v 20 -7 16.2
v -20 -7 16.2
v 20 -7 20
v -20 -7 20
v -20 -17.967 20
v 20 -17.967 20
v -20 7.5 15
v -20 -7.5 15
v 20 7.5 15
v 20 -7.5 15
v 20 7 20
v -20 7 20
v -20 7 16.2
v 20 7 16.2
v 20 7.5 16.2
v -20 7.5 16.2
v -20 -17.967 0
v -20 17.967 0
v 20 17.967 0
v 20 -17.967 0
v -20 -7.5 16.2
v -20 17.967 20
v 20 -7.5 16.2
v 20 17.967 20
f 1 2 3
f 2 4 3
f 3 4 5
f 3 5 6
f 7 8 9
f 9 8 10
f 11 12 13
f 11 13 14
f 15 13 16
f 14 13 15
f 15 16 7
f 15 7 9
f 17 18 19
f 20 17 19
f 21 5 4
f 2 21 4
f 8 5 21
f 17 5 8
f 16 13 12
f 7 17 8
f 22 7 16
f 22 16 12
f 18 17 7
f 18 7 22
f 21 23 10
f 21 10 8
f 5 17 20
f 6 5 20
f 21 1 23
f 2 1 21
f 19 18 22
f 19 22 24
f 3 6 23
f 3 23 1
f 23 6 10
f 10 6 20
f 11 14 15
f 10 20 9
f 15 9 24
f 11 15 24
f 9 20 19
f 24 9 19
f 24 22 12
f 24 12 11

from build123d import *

# Parameters (mm, degrees)
F0_W      = 40
F0_H      = 35.9344822692
F1_DEPTH  = 20
F2_W      = 28
F2_H      = 14
F3_DEPTH  = 5
F4_W      = 14
F4_H      = 1.12
F5_DEPTH  = 3
F6_W      = 3
F6_H      = 1
F7_DEPTH  = 0.5
F8_W      = 12
F8_H      = 14
F9_DEPTH  = 2.5
F10_DEPTH = 25
F11_W     = 9.0484669507
F11_H     = 1.2658234112
F11_H_2   = 5.2294719476
F12_DEPTH = 2.5
F13_W     = 40
F13_H     = 1.2
F14_DEPTH = 0.5
F15_W     = 40
F15_H     = 1.2
F16_DEPTH = 0.5
F17_DEPTH = 2.5


with BuildPart() as f1:
    # F0 (on Top) → F1 (new body)
    with BuildSketch(Plane.XY):
        Rectangle(F0_W, F0_H)
    extrude(amount=F1_DEPTH)

    # F2 (on face) → F3 (cut)
    with BuildSketch(Plane.XY.offset(20)):
        with Locations((6, 0)):
            Rectangle(F2_W, F2_H)
    extrude(amount=-F3_DEPTH, mode=Mode.SUBTRACT)

    # F4 (on face) → F5 (cut)
    with BuildSketch(Plane.YZ.offset(-8)):
        with Locations((0, 15.56)):
            Rectangle(F4_W, F4_H)
    extrude(amount=-F5_DEPTH, mode=Mode.SUBTRACT)

    # F6 (on face) → F7 (cut)
    with BuildSketch(Plane(origin=(0, 0, 16.12), x_dir=(1, 0, 0), z_dir=(0, 0, -1))):
        with Locations((-9.5, -3.5)):
            Rectangle(F6_W, F6_H)
        with Locations((-9.5, -2.25)):
            Rectangle(F6_W, F6_H)
        with Locations((-9.5, -1)):
            Rectangle(F6_W, F6_H)
        with Locations((-9.5, 0.25)):
            Rectangle(F6_W, F6_H)
    extrude(amount=-F7_DEPTH, mode=Mode.SUBTRACT)

    # F8 (on face) → F9 (cut)
    with BuildSketch(Plane.XY.offset(20)):
        with Locations((-14, 0)):
            Rectangle(F8_W, F8_H)
    extrude(amount=-F9_DEPTH, mode=Mode.SUBTRACT)

    # F10 (cut): a face of the model
    f10_faces = [f1.faces().sort_by_distance(p)[0] for p in [
        (-11, 0.1838235294, 15.6516289593),
    ]]
    extrude(f10_faces, amount=-F10_DEPTH, mode=Mode.SUBTRACT)

    # F11 (on face) → F12 (cut, through all)
    with BuildSketch(Plane.XY.offset(17.5)):
        with Locations((-12.5242334753, 6.3670882944)):
            Rectangle(F11_W, F11_H)
        with Locations((-12.5242334753, -4.3852640262)):
            Rectangle(F11_W, F11_H_2)
    extrude(amount=-F12_DEPTH, mode=Mode.SUBTRACT)

    # F13 (on face) → F14 (cut)
    with BuildSketch(Plane(origin=(0, -7, 0), x_dir=(-1, 0, 0), z_dir=(0, 1, 0))):
        with Locations((0, 15.6)):
            Rectangle(F13_W, F13_H)
    extrude(amount=-F14_DEPTH, mode=Mode.SUBTRACT)

    # F15 (on face) → F16 (cut)
    with BuildSketch(Plane.XZ.offset(-7)):
        with Locations((0, 15.6)):
            Rectangle(F15_W, F15_H)
    extrude(amount=-F16_DEPTH, mode=Mode.SUBTRACT)

    # F17 (cut, through all): a face of the model
    f17_faces = [f1.faces().sort_by_distance(p)[0] for p in [
        (-14.7940711772, 1.2320876945, 17.5),
    ]]
    extrude(f17_faces, amount=-F17_DEPTH, mode=Mode.SUBTRACT)


solid = f1.part
